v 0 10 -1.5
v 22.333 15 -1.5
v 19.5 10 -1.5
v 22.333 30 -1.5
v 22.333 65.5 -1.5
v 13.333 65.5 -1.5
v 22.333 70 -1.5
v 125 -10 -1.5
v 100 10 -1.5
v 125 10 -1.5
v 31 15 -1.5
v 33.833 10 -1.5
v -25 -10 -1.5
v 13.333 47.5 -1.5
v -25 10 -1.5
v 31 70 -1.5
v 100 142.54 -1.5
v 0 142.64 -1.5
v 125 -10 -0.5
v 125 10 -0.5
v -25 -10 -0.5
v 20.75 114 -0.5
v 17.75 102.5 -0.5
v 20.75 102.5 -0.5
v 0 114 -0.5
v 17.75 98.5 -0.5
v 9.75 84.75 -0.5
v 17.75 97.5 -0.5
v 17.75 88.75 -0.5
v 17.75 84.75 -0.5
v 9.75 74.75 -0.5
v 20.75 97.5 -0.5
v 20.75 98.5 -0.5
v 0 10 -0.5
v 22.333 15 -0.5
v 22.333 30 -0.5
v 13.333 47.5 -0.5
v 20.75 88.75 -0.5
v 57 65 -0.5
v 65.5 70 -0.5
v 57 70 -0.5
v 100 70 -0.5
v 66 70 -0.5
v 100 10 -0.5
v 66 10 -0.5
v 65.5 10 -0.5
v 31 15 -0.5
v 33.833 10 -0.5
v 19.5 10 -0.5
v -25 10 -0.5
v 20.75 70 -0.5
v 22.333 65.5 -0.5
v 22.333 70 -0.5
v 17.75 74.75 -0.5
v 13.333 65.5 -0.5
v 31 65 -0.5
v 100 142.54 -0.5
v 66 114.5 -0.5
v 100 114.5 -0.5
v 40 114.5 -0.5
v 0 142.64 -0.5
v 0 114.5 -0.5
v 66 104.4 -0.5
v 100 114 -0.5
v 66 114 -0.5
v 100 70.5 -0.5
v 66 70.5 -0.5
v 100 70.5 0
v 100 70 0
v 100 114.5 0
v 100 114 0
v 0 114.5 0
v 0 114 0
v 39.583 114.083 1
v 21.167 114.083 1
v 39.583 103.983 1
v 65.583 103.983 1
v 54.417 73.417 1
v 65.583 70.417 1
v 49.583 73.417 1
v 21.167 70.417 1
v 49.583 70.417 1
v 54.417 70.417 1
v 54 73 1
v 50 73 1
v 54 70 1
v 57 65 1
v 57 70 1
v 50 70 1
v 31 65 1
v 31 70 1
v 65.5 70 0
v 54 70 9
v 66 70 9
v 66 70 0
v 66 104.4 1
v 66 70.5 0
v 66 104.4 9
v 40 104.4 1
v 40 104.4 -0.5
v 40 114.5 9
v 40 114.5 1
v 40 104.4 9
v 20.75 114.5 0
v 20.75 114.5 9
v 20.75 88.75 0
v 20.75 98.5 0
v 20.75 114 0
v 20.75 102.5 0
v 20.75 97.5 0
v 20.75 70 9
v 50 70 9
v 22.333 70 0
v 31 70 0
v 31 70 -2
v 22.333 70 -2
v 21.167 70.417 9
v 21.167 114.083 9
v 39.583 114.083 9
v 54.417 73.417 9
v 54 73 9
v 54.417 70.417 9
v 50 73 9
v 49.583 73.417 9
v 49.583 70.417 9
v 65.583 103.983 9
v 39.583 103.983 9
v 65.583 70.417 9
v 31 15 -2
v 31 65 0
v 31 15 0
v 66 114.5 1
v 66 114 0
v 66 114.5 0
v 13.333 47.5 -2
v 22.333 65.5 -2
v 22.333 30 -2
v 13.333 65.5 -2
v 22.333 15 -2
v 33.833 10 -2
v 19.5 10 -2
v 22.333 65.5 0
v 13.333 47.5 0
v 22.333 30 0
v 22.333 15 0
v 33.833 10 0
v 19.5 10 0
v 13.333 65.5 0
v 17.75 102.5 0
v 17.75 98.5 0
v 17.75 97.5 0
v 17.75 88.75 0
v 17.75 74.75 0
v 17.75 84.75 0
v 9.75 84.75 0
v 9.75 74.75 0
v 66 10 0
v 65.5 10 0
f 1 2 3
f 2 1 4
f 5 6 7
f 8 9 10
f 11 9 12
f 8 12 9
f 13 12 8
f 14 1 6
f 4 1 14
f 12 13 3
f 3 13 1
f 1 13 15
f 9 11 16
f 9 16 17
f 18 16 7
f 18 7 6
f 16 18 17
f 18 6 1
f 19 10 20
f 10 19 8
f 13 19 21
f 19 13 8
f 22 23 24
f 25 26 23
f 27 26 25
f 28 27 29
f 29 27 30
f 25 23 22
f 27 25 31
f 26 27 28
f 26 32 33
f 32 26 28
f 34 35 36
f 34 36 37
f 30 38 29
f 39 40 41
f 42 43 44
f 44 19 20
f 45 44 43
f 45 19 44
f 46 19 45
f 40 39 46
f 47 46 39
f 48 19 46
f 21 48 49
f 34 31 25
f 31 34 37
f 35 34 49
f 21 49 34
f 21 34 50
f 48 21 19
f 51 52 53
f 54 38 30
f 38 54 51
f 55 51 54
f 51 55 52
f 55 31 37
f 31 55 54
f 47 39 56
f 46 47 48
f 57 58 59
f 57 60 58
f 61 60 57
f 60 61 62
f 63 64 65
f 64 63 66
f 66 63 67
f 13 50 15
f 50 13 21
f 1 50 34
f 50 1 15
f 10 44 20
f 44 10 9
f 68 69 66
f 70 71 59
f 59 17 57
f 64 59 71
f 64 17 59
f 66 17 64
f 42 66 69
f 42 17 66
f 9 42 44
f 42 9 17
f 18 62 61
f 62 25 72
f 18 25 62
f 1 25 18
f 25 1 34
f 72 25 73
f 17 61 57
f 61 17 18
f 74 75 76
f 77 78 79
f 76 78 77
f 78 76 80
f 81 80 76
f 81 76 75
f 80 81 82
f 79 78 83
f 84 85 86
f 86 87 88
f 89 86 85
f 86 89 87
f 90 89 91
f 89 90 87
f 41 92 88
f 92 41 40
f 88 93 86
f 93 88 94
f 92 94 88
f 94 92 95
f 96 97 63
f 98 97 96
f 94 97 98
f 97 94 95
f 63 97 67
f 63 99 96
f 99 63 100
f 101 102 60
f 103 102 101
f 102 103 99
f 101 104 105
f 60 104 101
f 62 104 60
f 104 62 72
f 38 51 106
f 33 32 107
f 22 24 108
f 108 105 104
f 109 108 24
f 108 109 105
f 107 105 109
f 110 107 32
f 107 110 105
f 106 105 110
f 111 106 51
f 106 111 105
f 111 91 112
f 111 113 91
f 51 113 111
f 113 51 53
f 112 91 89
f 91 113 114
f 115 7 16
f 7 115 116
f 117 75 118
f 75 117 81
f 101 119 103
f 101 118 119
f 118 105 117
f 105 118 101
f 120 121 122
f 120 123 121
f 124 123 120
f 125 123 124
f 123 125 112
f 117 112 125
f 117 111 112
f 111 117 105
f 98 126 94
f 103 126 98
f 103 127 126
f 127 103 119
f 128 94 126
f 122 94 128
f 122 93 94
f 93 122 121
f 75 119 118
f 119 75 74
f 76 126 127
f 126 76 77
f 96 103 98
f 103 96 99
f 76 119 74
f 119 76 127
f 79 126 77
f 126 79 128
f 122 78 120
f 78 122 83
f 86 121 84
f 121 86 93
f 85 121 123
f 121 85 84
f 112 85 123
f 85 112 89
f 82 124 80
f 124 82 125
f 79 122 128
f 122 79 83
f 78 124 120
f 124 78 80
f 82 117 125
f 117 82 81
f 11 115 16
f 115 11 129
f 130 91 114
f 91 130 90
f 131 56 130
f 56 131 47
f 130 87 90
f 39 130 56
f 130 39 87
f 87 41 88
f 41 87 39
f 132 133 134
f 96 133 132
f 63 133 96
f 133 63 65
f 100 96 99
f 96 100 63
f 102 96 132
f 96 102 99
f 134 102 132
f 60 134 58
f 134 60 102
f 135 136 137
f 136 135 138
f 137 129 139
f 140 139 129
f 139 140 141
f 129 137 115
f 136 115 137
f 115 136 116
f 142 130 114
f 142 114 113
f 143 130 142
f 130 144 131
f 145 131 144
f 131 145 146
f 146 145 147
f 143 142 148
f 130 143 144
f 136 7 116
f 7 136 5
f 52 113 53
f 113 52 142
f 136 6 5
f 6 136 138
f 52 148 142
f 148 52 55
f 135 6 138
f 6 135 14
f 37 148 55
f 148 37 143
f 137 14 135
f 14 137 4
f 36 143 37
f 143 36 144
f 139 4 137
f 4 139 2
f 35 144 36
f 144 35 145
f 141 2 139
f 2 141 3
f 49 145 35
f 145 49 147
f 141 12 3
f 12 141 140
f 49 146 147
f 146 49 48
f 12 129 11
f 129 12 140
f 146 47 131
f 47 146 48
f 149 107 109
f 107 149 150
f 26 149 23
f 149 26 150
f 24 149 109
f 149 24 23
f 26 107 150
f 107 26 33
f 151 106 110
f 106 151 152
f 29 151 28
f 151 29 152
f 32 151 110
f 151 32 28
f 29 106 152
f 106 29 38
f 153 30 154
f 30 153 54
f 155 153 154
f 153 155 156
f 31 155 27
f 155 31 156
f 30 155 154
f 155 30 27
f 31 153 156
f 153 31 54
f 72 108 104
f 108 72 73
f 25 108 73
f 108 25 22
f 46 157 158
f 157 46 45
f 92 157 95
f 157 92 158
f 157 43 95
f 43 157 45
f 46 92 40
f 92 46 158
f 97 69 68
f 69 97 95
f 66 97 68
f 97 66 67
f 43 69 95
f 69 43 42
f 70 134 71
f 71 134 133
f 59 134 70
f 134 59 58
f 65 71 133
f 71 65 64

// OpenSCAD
module InteriorWall(y){color("lemonchiffon",Opacity)cube([5/12,y,8]);}
module ExteriorWall(y){color("pink",Opacity)cube([5/12,y,8]);}

Opacity=0.8;

module Pump(){color("darkgray",Opacity)cube([3,4,1]);}
module AirConditioner(){color("darkgray",Opacity)cube([3,8.75,1]);}
module Shed(){color("darkgray",Opacity)cube([8,10,1]);}

street=[[0,0],[150,0],[150,20],[0,20]];
translate([-25,-10,-1])color("Gray")linear_extrude(height = 1, center = true, convexity = 10, twist = 0)polygon(street);

parkway=[[0,0],[100,0],[100,15],[0,15]];
translate([0,10,-1])color("Aquamarine")linear_extrude(height = 1, center = true, convexity = 10, twist = 0)polygon(parkway);

lot=[[100,0],[0,0],[0,117.64],[100,117.54]];
translate([0,25,-1])color("azure")linear_extrude(height = 1, center = true, convexity = 10, twist = 0)polygon(lot);


module InteriorWall(y){color("lemonchiffon",Opacity)cube([5/12,y,8]);}
module ExteriorWall(y){color("pink",Opacity)cube([5/12,y,8]);}


moveHouse=[20.75,70];

p0=[0,0]+moveHouse;
p1=p0+[0,44.5];
p2=p1+[19.25,0];
p3=p2+[0,-10.10];
p4=p3+[26,0];
p5=p4+[0,-34.4];
p6=p5+[-12,0];
p7=p6+[0,3];
p8=p7+[-4,0];
p9=p8+[0,-3];
p10=[0,0];
p11=[0,0];
p12=[0,0];
p13=[0,0];
p14=[0,0];
p15=[0,0];
p16=[0,0];
p17=[0,0];

a=[p0,p1,p2,p3,p4,p5,p6,p7,p8,p9];

color("LightGray",Opacity)linear_extrude(height = 2, center = true, convexity = 10, twist = 0)polygon(a);

raise=[0,0,1];
 
translate(p0)translate(raise)ExteriorWall(44.5);
translate(p1)translate(raise)rotate([0,0,270])ExteriorWall(19.25);
translate(p1+[19.25,-10.1])translate(raise)rotate([0,0,270])ExteriorWall(26);
translate(p1+[19.25,0])translate(raise)rotate([0,0,180])ExteriorWall(10.1+5/12);
translate(p4)translate(raise)rotate([0,0,180])ExteriorWall(44.5-10.1);
translate(p5+[-12,0,0])translate(raise)ExteriorWall(3);
translate(p5+[-12-4,3,0])translate(raise)rotate([0,0,180])ExteriorWall(3);
translate(p5)rotate([0,0,90])translate(raise)ExteriorWall(12);
translate(p5+[-12+5/12,3,0])translate(raise)rotate([0,0,90])ExteriorWall(4+2*5/12);
translate(p5+[-12-4,0,0])translate(raise)rotate([0,0,90])ExteriorWall(19.25+26-12-4);


por0=[0,0];
por1=[0,5];
por2=por1+[19,0];
por3=por2+[0,3];
por4=por3+[4,0];
por5=por4+[0,-3];
por6=por5+[3,0];
por7=por6+[0,-5];

porch=[por0,por1,por2,por3,por4,por5,por6,por7];

translate(moveHouse+[10.25,-5])color("Cornsilk",0.8)linear_extrude(height = 2, center = true, convexity = 10, twist = 0)polygon(porch);

deck0=[0,0];
deck1=deck0+[0,10.10];
deck2=deck1+[26,0];
deck3=deck2+[0,-10.10];

deck=[deck0,deck1,deck2,deck3];

translate(p3)color("Cornsilk",0.8)linear_extrude(height = 2, center = true, convexity = 10, twist = 0)polygon(deck);

dr0=[0,0];
dr1=dr0+[0,-55];
dr2=dr1+[2+10/12,-5];
dr3=dr2+[-14-4/12,0];
dr4=dr3+[2+10/12,5];
dr5=dr4+[0,15];
dr6=dr5+[-9,17.5];
dr7=dr6+[0,18];
dr8=dr7+[9,0];
dr9=dr8+[0,4.5];

driveway=[dr0,dr1,dr2,dr3,dr4,dr5,dr6,dr7,dr8,dr9];

translate(moveHouse+[10.25,0])translate([0,0,-1])color("gray",Opacity)linear_extrude(height = 2, center = true, convexity = 10, twist = 0)polygon(driveway);

translate(p1)translate([-3,-12-4])translate([0,0,-1])Pump();
translate(p1)translate([-3,-12-4-1-8.75])translate([0,0,-1])AirConditioner();
translate(p1)translate([-3-8,-12-4-1-8.75-10-4])translate([0,0,-1])Shed();

translate([0,114,-1])color("black",Opacity)cube([20.75,0.5,1]);
translate([7, 60,-.5]) {color("black",Opacity)rotate(90)
   text("W ~1969 sqft", font = "Liberation Sans", size=3);
 }

translate([66-0.5,70,-1])rotate(270)color("black",Opacity)cube([60,0.5,1]);
translate([40, 40,-.5]) {color("black",Opacity)
   text("S 1963 sqft", font = "Liberation Sans", size=3);
 }
translate([70, 45,-.5]) {color("black",Opacity)
   text("SE 34' x 60'", font = "Liberation Sans", size=3);
 }translate([70, 40,-.5]) {color("black",Opacity)
   text("= 2040 sqft", font = "Liberation Sans", size=3);
 }

translate([66,70,-1])color("black",Opacity)cube([34,0.5,1]);
translate([70, 95,-.5]) {color("black",Opacity)
   text("E 34.0' x 44.5'", font = "Liberation Sans", size=3);
 }translate([70, 90,-.5]) {color("black",Opacity)
   text("= 1513 sqft", font = "Liberation Sans", size=3);
 }

translate([66,114,-1])color("black",Opacity)cube([34,0.5,1]);
translate([40, 130,-.5]) {color("black",Opacity)
   text("N 28.5' x 100.0'", font = "Liberation Sans", size=3);
 }translate([40, 125,-.5]) {color("black",Opacity)
   text("= 2800 sqft", font = "Liberation Sans", size=3);
 }
